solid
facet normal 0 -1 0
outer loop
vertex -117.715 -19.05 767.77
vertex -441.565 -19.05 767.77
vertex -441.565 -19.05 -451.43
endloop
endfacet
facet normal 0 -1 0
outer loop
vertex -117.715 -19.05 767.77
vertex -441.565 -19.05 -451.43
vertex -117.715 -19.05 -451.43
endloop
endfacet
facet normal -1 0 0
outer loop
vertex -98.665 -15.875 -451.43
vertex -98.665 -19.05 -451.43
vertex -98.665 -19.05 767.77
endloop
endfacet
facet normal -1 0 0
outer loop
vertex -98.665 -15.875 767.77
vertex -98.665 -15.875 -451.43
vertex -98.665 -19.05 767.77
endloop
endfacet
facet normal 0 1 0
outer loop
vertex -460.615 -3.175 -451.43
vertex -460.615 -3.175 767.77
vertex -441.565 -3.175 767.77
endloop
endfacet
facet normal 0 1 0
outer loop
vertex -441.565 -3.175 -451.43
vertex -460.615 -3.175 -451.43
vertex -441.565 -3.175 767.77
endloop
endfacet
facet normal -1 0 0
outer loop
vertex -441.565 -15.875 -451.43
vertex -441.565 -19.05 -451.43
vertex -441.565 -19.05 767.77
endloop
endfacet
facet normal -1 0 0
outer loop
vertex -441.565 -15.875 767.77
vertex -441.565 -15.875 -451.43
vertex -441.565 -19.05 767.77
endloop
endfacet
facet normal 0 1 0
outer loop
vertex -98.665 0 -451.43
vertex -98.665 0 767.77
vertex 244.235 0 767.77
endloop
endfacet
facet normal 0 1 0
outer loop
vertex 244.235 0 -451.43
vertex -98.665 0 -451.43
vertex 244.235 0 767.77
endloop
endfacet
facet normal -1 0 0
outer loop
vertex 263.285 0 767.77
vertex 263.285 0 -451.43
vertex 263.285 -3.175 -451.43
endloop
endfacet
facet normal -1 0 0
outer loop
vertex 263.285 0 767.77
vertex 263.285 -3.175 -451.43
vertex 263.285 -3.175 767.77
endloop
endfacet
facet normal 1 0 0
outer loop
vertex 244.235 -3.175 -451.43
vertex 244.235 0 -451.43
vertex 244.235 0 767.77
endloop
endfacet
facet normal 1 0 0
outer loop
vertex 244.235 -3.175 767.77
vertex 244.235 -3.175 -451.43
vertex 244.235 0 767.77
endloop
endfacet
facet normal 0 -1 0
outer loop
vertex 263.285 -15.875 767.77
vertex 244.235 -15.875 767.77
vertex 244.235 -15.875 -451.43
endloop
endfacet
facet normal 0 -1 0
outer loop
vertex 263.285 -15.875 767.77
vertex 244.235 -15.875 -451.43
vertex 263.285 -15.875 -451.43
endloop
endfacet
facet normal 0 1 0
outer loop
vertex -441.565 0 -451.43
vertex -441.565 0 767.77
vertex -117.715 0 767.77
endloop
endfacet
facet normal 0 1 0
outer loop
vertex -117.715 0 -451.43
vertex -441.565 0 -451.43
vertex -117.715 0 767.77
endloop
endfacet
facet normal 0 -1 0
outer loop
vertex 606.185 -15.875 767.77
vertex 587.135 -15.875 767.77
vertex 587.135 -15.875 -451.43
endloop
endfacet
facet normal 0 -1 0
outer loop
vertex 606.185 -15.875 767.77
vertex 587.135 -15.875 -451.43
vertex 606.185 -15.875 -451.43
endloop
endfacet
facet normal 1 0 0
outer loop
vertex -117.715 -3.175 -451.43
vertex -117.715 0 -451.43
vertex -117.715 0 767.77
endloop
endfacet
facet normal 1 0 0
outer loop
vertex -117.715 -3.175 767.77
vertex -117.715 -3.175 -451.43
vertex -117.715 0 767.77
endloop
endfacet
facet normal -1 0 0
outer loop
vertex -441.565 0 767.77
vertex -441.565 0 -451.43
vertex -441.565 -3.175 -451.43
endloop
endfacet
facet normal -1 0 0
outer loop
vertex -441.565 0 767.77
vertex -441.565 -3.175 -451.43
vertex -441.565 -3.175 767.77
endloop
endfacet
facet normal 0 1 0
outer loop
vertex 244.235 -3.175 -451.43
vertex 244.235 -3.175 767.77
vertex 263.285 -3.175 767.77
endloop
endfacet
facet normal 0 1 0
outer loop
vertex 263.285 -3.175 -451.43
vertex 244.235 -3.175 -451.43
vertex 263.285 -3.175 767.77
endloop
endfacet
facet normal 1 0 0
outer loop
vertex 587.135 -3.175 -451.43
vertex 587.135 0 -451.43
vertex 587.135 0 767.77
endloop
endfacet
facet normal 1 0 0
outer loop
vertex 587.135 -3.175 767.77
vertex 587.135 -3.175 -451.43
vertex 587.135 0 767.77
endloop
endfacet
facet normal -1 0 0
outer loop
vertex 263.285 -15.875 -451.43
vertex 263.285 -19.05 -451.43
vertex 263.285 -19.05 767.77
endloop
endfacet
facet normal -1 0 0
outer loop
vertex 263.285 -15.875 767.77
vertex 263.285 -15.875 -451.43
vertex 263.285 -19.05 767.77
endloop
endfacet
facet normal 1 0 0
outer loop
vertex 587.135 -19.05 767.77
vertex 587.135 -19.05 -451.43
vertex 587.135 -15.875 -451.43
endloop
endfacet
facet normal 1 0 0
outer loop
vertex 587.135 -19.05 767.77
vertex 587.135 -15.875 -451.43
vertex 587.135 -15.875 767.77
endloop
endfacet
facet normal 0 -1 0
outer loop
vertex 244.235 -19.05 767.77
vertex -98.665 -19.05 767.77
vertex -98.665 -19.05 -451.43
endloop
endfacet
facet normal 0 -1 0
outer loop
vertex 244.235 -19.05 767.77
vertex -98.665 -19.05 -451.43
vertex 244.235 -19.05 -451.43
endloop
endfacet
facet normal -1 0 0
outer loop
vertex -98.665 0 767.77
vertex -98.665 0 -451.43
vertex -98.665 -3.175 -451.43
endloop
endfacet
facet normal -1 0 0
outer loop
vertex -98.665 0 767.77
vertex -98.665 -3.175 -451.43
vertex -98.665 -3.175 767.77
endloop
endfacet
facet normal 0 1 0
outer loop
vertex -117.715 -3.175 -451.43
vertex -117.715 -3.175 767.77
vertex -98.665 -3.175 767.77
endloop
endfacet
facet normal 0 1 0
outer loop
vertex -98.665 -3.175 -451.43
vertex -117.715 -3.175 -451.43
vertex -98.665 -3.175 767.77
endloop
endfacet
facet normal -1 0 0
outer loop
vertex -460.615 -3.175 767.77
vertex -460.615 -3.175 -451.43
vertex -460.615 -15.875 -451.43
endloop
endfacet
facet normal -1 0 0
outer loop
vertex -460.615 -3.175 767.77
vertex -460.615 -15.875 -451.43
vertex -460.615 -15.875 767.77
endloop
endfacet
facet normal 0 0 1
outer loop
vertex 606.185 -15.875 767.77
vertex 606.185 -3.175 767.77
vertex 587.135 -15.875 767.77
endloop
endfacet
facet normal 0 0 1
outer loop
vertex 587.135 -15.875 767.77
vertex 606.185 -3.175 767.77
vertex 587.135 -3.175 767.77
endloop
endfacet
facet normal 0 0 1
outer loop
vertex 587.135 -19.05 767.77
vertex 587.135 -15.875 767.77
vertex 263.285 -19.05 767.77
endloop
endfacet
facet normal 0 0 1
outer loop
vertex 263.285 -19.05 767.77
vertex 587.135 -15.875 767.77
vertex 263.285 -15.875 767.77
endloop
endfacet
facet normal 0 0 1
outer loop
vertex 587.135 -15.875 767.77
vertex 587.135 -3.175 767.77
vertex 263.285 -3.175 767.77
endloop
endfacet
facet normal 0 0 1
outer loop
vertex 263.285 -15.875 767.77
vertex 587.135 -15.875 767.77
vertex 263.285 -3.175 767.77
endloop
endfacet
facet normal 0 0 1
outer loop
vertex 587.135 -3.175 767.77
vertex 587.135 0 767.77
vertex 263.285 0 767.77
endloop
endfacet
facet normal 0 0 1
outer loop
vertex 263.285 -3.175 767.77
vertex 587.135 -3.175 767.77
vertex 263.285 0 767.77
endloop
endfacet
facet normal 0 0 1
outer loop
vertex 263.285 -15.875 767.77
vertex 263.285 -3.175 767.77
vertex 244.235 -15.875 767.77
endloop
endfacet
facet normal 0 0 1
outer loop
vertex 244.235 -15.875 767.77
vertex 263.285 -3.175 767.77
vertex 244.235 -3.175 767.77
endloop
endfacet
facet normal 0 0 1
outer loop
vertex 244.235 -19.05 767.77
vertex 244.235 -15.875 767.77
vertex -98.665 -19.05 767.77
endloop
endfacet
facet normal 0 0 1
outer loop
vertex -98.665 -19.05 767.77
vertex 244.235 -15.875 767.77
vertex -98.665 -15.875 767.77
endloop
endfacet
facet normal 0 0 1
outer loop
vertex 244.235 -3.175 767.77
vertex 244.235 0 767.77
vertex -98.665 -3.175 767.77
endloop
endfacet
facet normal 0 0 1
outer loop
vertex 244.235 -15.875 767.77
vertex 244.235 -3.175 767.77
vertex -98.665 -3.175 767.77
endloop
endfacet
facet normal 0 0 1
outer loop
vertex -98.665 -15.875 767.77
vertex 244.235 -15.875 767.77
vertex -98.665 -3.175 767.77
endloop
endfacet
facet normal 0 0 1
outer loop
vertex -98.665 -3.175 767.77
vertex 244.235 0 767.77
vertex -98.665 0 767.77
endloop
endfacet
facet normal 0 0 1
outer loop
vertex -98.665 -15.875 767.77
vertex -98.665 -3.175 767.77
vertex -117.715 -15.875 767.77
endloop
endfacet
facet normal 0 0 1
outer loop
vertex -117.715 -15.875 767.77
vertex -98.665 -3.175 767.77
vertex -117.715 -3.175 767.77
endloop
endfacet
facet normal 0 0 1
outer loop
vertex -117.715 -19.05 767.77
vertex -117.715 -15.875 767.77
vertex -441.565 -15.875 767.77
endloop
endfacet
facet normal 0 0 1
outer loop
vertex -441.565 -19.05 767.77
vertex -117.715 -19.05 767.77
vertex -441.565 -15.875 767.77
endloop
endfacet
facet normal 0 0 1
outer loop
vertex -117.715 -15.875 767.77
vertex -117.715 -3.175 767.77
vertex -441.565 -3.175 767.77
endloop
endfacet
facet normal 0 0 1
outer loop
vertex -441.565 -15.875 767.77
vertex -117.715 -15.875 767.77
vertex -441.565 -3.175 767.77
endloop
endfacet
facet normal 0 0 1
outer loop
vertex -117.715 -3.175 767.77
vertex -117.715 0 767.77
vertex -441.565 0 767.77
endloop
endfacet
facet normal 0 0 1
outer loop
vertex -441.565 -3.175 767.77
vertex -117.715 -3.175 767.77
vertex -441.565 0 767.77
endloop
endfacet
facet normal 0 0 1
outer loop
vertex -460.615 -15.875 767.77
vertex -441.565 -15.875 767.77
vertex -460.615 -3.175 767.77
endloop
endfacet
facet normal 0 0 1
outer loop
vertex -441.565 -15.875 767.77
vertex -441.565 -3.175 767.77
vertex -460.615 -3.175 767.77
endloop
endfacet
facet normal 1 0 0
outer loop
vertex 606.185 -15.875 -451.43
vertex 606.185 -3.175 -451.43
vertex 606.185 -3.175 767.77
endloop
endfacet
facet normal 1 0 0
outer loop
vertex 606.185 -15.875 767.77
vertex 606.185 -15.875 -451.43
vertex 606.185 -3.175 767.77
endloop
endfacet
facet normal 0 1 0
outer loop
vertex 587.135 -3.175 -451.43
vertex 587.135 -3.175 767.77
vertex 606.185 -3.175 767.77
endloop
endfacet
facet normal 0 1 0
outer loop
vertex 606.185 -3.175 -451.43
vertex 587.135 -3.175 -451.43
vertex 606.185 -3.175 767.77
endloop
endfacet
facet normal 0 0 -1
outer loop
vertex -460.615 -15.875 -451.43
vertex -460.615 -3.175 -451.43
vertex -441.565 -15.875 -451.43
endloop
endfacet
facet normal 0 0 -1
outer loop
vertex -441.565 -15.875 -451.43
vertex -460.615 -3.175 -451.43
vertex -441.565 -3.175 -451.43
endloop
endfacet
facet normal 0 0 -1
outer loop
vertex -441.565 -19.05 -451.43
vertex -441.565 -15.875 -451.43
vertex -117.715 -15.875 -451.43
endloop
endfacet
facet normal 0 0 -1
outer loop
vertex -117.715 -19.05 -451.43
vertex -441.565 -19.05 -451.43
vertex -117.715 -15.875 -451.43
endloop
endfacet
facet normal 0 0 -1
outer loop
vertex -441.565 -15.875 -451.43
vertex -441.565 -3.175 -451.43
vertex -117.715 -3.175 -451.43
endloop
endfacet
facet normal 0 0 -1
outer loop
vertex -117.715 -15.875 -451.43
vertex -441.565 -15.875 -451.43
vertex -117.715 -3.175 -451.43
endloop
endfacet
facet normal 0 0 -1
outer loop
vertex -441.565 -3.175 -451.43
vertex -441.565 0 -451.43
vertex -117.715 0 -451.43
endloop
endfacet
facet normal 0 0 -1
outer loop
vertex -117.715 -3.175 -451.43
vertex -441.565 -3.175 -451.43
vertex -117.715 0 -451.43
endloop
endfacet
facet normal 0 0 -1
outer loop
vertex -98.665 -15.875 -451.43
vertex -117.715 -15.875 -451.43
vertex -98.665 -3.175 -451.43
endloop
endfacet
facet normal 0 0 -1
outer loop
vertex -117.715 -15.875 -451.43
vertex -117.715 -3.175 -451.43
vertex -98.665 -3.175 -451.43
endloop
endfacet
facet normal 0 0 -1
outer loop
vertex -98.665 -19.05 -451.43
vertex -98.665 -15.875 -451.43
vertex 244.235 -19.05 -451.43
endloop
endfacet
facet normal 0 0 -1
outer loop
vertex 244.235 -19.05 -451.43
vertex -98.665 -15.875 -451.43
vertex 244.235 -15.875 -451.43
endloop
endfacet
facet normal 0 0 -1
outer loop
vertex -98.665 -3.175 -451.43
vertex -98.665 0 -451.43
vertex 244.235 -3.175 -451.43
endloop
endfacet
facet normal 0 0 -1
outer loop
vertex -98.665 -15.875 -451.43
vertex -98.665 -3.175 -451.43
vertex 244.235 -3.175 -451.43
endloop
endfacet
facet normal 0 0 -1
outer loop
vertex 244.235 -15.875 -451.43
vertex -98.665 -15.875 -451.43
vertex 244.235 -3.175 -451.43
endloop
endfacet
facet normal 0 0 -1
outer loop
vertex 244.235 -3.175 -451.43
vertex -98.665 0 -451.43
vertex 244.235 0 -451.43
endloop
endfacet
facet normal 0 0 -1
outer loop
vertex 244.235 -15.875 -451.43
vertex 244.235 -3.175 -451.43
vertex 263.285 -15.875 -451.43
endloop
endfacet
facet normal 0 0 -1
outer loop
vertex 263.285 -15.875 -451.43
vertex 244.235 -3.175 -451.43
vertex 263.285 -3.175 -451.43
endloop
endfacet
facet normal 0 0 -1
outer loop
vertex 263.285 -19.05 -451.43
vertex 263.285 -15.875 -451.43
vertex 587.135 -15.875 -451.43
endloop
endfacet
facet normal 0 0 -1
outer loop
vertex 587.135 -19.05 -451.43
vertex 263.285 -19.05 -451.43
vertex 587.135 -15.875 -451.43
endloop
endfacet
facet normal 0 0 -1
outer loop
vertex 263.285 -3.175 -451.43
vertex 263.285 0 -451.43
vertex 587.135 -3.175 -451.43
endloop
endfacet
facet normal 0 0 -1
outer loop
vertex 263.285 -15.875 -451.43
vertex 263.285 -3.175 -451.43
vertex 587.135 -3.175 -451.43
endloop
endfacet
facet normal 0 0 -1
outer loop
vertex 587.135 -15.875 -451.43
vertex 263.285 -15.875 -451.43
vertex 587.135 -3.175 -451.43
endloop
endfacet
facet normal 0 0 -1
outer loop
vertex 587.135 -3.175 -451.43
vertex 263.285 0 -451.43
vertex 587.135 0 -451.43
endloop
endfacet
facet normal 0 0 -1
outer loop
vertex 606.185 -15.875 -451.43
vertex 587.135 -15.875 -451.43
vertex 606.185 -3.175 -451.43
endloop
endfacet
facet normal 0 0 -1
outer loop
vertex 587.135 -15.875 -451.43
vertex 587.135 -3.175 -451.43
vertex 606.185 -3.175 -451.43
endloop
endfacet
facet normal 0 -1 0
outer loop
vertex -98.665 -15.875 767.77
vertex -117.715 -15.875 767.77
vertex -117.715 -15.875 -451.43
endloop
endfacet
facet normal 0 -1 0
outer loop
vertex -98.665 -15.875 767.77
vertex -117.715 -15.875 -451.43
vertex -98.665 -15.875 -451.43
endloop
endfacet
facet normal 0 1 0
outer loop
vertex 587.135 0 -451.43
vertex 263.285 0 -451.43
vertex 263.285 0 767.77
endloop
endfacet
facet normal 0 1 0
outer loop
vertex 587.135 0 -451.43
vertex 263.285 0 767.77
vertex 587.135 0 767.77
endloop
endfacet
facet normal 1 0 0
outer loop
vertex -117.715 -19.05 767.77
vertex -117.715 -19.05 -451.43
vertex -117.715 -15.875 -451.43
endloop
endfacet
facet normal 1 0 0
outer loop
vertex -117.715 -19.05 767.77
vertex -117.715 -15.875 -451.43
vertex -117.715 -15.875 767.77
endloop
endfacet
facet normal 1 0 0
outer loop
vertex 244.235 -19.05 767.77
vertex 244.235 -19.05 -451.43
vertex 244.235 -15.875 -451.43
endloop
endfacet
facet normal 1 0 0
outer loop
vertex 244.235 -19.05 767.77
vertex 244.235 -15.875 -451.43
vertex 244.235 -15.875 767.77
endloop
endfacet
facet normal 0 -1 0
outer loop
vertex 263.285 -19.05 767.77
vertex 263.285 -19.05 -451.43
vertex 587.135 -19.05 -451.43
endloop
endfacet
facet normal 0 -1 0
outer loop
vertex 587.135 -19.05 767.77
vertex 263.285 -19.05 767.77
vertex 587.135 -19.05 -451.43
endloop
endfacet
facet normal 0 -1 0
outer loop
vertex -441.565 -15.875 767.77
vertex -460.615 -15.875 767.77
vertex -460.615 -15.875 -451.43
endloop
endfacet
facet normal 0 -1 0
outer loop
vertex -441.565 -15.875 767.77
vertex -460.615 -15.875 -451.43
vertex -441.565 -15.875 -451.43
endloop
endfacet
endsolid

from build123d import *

# Parameters (mm, degrees)
F0_W     = 19.05
F0_H     = 1219.2
F0_W_2   = 323.85
F0_W_3   = 342.9
F1_DEPTH = 19.05
F2_DEPTH = 3.175
F3_W     = 19.05
F3_H     = 1219.2
F4_DEPTH = 3.175


with BuildPart() as f1:
    # F0 (on Front) → F1 (new body)
    with BuildSketch(Plane.XZ):
        with Locations((-451.089586, 158.169563)):
            Rectangle(F0_W, F0_H)
        with Locations((-279.639586, 158.169563)):
            Rectangle(F0_W_2, F0_H)
        with Locations((-108.189586, 158.169563)):
            Rectangle(F0_W, F0_H)
        with Locations((72.785414, 158.169563)):
            Rectangle(F0_W_3, F0_H)
        with Locations((253.760414, 158.169563)):
            Rectangle(F0_W, F0_H)
        with Locations((425.210414, 158.169563)):
            Rectangle(F0_W_2, F0_H)
        with Locations((596.660414, 158.169563)):
            Rectangle(F0_W, F0_H)
    extrude(amount=F1_DEPTH)

    # F0 (on Front) → F2 (cut)
    with BuildSketch(Plane.XZ):
        with Locations((596.660414, 158.169563)):
            Rectangle(F0_W, F0_H)
        with Locations((-451.089586, 158.169563)):
            Rectangle(F0_W, F0_H)
        with Locations((253.760414, 158.169563)):
            Rectangle(F0_W, F0_H)
        with Locations((-108.189586, 158.169563)):
            Rectangle(F0_W, F0_H)
    extrude(amount=F2_DEPTH, mode=Mode.SUBTRACT)

    # F3 (on face) → F4 (cut)
    with BuildSketch(Plane.XZ.offset(19.05)):
        with Locations((596.660414, 158.169563)):
            Rectangle(F3_W, F3_H)
        with Locations((-451.089586, 158.169563)):
            Rectangle(F3_W, F3_H)
        with Locations((-108.189586, 158.169563)):
            Rectangle(F3_W, F3_H)
        with Locations((253.760414, 158.169563)):
            Rectangle(F3_W, F3_H)
    extrude(amount=-F4_DEPTH, mode=Mode.SUBTRACT)


solid = f1.part
